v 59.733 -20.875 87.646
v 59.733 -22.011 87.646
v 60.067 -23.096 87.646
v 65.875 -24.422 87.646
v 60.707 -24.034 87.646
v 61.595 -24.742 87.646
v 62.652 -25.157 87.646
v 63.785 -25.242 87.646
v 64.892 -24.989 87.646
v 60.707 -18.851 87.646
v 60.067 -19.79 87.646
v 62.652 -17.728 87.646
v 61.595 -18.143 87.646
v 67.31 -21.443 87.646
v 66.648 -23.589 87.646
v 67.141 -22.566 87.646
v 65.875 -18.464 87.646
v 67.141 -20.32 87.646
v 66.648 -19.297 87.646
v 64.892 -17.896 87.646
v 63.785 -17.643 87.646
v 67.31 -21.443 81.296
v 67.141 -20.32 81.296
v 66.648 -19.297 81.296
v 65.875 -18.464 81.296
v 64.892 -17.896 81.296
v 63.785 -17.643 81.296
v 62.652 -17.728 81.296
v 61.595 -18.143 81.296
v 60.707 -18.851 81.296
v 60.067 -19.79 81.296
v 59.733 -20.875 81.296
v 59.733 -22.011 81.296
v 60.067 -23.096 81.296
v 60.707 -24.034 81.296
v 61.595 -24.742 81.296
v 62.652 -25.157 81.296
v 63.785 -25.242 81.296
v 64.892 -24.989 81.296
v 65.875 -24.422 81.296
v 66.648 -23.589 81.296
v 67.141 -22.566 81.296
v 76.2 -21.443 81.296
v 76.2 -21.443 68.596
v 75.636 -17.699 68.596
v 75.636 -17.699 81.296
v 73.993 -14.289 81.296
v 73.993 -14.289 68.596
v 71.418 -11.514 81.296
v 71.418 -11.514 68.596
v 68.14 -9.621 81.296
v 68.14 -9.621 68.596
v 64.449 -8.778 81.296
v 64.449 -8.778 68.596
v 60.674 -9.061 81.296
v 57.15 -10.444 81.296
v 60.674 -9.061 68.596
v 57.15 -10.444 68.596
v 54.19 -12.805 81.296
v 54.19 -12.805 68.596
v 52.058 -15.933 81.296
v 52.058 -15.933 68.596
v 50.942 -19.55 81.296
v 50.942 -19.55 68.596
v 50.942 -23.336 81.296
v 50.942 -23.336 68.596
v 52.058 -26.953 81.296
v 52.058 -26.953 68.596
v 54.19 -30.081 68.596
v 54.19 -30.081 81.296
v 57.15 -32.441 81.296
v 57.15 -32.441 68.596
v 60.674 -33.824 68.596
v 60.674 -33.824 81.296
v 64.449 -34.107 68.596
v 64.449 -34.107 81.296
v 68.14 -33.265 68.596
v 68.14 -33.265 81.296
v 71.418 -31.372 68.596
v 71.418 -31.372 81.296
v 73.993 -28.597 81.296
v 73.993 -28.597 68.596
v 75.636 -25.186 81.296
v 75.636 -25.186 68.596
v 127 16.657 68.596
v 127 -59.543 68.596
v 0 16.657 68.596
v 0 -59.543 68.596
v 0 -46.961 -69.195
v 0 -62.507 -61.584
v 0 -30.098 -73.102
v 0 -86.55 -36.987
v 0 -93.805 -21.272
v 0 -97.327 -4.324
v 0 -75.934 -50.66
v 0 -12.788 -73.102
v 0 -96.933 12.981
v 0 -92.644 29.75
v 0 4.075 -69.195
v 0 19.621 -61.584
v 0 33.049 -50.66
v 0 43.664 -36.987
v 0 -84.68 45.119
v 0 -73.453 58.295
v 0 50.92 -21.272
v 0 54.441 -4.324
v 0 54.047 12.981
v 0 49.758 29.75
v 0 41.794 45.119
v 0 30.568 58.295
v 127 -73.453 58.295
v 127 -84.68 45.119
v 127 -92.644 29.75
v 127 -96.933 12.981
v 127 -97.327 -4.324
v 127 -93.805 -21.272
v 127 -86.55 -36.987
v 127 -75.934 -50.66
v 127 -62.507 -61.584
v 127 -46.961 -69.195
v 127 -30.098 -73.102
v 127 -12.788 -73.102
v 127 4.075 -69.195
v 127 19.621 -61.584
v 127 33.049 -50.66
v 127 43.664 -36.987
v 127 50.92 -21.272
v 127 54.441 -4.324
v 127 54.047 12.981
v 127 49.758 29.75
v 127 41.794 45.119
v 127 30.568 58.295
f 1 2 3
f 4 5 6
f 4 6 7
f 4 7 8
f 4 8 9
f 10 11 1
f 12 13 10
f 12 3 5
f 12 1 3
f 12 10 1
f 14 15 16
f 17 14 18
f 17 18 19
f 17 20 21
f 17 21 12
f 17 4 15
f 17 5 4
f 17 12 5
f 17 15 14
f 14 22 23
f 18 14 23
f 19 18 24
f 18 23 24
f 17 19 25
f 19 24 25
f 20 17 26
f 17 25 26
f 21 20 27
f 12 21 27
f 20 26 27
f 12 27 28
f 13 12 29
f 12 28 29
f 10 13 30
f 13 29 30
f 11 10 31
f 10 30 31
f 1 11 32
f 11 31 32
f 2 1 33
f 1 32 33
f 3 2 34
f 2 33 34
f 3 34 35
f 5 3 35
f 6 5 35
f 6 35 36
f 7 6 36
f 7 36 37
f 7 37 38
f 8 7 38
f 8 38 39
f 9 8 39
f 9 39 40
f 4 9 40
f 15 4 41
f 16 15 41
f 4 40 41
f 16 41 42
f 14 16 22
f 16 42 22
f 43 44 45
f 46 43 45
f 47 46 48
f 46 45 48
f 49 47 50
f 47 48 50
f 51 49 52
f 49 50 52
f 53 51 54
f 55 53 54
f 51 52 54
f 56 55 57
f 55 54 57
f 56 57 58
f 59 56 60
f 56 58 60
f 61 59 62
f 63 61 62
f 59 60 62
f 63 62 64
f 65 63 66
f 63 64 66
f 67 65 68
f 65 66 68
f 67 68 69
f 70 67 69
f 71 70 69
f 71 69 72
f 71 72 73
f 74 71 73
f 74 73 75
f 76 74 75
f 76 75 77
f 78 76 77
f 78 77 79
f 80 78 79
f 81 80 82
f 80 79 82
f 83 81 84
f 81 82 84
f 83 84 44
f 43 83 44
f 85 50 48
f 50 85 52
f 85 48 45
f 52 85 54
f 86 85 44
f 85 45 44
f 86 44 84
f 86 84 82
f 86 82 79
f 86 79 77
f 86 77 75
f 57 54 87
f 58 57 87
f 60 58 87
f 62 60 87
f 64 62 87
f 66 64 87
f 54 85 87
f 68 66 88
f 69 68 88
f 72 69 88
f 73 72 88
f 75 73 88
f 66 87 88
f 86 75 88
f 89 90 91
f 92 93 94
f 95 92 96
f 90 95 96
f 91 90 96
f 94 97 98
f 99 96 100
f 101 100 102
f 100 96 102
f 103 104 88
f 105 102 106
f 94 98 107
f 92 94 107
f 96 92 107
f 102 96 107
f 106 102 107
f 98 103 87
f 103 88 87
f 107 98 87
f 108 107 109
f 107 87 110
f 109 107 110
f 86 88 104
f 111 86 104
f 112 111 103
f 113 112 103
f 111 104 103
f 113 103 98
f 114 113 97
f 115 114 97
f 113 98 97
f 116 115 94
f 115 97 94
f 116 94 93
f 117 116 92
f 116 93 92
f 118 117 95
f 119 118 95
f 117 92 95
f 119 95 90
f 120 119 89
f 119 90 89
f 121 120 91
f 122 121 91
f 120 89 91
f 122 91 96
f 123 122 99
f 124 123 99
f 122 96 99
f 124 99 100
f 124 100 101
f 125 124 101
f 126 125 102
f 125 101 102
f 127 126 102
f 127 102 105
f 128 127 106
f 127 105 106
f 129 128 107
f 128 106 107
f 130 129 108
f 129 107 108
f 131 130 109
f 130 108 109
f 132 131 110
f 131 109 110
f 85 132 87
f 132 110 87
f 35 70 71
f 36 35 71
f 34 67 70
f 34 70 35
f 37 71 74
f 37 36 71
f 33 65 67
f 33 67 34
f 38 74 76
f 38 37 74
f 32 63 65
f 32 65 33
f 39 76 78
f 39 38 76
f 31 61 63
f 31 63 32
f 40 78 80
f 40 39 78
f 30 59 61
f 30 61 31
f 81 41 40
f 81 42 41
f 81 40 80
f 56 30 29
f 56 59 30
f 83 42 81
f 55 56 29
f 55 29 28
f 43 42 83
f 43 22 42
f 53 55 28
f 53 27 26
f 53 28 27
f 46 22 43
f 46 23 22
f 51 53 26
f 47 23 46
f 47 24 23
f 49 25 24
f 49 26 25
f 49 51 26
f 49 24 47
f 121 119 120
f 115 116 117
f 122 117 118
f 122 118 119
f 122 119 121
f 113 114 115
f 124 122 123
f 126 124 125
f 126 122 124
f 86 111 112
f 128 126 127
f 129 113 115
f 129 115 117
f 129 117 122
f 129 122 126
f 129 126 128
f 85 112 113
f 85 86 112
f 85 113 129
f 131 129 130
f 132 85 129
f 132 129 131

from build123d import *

# Parameters (mm, degrees)
F1_DEPTH = 127
F2_R     = 12.7
F3_DEPTH = 12.7
F4_R     = 3.81
F5_DEPTH = 6.35


with BuildPart() as f1:
    # F0 (on Right) → F1 (new body)
    with BuildSketch(Plane.YZ):
        with BuildLine():
            Line((16.657175, 68.595961), (-59.542825, 68.595961))
            ThreePointArc((-59.542825, 68.595961), (-21.442825, -73.595175), (16.657175, 68.595961))
        make_face()
    extrude(amount=F1_DEPTH)

    # F2 (on face) → F3 (join)
    with BuildSketch(Plane.XY.offset(68.595961)):
        with Locations((63.5, -21.442825)):
            Circle(F2_R)
    extrude(amount=F3_DEPTH)

    # F4 (on face) → F5 (join)
    with BuildSketch(Plane.XY.offset(81.295961)):
        with Locations((63.5, -21.442825)):
            Circle(F4_R)
    extrude(amount=F5_DEPTH)


solid = f1.part
